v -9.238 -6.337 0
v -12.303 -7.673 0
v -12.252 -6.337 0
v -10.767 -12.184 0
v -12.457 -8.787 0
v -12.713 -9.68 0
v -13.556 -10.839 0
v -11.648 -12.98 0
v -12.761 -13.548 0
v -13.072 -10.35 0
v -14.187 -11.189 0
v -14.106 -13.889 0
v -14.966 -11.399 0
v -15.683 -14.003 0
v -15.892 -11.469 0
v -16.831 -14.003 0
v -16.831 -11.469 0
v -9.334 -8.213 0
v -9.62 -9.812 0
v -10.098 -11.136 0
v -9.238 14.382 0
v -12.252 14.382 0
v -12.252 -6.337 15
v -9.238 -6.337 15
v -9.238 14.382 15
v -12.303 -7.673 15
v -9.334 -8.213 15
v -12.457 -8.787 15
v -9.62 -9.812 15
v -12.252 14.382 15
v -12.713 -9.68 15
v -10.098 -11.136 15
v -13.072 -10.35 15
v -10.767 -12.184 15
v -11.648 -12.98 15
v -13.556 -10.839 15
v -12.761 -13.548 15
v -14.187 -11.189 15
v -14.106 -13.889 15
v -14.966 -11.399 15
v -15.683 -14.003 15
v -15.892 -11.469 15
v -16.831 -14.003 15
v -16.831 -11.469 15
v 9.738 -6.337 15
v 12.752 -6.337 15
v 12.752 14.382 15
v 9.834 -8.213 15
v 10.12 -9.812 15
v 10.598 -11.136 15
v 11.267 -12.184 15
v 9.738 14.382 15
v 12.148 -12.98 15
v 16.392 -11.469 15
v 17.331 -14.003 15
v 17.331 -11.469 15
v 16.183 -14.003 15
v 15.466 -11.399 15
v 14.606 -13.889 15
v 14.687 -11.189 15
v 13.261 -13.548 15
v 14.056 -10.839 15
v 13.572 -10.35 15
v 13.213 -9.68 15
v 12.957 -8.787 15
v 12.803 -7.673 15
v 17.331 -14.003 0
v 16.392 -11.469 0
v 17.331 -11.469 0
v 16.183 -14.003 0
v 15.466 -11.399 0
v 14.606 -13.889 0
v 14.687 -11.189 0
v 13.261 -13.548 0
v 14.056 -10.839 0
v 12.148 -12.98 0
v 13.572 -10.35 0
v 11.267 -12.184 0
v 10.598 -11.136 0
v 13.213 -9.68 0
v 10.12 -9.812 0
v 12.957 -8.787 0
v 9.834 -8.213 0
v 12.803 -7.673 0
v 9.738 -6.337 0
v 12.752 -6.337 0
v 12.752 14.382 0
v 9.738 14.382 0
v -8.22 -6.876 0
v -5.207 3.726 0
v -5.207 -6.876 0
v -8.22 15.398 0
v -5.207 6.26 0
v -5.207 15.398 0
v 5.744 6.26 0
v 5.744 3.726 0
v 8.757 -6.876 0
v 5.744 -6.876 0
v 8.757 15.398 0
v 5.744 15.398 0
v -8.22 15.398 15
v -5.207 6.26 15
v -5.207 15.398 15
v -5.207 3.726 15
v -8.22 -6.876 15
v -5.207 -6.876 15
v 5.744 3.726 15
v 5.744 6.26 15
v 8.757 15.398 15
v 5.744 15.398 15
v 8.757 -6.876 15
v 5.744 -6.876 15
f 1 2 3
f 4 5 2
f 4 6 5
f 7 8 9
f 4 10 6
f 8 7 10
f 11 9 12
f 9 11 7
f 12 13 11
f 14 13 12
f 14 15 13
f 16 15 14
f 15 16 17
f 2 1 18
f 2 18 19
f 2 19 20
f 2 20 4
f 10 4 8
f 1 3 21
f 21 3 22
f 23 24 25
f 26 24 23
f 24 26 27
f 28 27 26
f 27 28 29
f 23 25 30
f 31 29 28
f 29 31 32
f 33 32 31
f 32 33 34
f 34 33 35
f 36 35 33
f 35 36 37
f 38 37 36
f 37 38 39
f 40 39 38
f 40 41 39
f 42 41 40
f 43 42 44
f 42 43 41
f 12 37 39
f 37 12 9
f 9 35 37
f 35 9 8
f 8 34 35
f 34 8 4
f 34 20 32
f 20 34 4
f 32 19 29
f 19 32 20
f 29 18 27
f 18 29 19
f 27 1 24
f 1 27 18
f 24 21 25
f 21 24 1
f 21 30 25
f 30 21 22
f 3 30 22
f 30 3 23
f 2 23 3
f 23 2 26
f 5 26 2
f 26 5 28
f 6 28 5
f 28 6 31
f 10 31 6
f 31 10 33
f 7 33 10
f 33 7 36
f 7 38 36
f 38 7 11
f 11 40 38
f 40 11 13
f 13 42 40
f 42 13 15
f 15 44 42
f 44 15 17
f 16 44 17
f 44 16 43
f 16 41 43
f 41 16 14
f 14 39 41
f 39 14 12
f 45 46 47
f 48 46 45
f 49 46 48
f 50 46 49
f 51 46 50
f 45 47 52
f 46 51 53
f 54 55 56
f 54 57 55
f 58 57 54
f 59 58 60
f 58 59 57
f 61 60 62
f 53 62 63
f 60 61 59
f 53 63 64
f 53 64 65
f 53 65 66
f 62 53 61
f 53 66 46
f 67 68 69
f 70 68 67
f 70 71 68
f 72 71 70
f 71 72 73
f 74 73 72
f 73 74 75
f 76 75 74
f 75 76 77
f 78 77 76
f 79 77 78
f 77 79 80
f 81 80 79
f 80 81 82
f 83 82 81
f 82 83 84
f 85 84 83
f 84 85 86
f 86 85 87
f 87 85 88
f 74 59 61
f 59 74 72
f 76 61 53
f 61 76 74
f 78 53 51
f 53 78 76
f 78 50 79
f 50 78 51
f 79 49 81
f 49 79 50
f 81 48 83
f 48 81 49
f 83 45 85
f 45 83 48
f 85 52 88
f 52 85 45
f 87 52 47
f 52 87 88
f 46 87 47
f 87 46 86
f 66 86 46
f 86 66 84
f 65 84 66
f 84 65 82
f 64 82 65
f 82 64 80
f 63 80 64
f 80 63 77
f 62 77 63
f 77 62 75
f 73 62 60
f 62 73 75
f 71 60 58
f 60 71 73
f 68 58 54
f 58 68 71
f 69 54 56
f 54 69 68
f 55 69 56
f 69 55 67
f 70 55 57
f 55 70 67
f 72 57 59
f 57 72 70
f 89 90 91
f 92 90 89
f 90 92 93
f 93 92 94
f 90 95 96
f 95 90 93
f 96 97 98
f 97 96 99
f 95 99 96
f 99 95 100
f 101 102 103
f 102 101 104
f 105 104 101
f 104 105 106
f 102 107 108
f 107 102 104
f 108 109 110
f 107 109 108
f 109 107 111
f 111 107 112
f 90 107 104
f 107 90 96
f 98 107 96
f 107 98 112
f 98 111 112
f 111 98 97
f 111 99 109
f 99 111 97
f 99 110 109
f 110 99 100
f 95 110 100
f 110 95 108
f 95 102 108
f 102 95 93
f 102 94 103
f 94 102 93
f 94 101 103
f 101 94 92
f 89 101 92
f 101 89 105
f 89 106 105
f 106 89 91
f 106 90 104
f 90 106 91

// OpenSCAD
    theFont = "Microsoft Sans Serif";
    scaleFactor = 22/30;        
    Logo();


module Logo(size=30) {
    union() {
            DualJs(size, "J");
            translate([0,4,0]) {
                linear_extrude(height=size/2, convexity=4)
                    text("H", 
                         size=size*scaleFactor,
                         font=theFont,
                         halign="center",
                         valign="center");
        }
    }
}

module DualJs(size) {
    letter = "J";
    separation = -10.85;
    
    union() {
             // "normal" J
            translate([separation,0,0]) {
                // convexity is needed for correct preview
                // since characters can be highly concave
                linear_extrude(height=size/2, convexity=4)
                    text(letter, 
                         size=size*scaleFactor,
                         font=theFont,
                         halign="center",
                         valign="center");
            }
            
            // "mirrored" J
            rotate([0,180,0])
            translate([separation-0.5,0,(-0.5) * size]) {
                linear_extrude(height=size/2, convexity=4)
                    text(letter, 
                         size=size*scaleFactor,
                         font=theFont,
                         halign="center",
                         valign="center");    
            }
    }
}
